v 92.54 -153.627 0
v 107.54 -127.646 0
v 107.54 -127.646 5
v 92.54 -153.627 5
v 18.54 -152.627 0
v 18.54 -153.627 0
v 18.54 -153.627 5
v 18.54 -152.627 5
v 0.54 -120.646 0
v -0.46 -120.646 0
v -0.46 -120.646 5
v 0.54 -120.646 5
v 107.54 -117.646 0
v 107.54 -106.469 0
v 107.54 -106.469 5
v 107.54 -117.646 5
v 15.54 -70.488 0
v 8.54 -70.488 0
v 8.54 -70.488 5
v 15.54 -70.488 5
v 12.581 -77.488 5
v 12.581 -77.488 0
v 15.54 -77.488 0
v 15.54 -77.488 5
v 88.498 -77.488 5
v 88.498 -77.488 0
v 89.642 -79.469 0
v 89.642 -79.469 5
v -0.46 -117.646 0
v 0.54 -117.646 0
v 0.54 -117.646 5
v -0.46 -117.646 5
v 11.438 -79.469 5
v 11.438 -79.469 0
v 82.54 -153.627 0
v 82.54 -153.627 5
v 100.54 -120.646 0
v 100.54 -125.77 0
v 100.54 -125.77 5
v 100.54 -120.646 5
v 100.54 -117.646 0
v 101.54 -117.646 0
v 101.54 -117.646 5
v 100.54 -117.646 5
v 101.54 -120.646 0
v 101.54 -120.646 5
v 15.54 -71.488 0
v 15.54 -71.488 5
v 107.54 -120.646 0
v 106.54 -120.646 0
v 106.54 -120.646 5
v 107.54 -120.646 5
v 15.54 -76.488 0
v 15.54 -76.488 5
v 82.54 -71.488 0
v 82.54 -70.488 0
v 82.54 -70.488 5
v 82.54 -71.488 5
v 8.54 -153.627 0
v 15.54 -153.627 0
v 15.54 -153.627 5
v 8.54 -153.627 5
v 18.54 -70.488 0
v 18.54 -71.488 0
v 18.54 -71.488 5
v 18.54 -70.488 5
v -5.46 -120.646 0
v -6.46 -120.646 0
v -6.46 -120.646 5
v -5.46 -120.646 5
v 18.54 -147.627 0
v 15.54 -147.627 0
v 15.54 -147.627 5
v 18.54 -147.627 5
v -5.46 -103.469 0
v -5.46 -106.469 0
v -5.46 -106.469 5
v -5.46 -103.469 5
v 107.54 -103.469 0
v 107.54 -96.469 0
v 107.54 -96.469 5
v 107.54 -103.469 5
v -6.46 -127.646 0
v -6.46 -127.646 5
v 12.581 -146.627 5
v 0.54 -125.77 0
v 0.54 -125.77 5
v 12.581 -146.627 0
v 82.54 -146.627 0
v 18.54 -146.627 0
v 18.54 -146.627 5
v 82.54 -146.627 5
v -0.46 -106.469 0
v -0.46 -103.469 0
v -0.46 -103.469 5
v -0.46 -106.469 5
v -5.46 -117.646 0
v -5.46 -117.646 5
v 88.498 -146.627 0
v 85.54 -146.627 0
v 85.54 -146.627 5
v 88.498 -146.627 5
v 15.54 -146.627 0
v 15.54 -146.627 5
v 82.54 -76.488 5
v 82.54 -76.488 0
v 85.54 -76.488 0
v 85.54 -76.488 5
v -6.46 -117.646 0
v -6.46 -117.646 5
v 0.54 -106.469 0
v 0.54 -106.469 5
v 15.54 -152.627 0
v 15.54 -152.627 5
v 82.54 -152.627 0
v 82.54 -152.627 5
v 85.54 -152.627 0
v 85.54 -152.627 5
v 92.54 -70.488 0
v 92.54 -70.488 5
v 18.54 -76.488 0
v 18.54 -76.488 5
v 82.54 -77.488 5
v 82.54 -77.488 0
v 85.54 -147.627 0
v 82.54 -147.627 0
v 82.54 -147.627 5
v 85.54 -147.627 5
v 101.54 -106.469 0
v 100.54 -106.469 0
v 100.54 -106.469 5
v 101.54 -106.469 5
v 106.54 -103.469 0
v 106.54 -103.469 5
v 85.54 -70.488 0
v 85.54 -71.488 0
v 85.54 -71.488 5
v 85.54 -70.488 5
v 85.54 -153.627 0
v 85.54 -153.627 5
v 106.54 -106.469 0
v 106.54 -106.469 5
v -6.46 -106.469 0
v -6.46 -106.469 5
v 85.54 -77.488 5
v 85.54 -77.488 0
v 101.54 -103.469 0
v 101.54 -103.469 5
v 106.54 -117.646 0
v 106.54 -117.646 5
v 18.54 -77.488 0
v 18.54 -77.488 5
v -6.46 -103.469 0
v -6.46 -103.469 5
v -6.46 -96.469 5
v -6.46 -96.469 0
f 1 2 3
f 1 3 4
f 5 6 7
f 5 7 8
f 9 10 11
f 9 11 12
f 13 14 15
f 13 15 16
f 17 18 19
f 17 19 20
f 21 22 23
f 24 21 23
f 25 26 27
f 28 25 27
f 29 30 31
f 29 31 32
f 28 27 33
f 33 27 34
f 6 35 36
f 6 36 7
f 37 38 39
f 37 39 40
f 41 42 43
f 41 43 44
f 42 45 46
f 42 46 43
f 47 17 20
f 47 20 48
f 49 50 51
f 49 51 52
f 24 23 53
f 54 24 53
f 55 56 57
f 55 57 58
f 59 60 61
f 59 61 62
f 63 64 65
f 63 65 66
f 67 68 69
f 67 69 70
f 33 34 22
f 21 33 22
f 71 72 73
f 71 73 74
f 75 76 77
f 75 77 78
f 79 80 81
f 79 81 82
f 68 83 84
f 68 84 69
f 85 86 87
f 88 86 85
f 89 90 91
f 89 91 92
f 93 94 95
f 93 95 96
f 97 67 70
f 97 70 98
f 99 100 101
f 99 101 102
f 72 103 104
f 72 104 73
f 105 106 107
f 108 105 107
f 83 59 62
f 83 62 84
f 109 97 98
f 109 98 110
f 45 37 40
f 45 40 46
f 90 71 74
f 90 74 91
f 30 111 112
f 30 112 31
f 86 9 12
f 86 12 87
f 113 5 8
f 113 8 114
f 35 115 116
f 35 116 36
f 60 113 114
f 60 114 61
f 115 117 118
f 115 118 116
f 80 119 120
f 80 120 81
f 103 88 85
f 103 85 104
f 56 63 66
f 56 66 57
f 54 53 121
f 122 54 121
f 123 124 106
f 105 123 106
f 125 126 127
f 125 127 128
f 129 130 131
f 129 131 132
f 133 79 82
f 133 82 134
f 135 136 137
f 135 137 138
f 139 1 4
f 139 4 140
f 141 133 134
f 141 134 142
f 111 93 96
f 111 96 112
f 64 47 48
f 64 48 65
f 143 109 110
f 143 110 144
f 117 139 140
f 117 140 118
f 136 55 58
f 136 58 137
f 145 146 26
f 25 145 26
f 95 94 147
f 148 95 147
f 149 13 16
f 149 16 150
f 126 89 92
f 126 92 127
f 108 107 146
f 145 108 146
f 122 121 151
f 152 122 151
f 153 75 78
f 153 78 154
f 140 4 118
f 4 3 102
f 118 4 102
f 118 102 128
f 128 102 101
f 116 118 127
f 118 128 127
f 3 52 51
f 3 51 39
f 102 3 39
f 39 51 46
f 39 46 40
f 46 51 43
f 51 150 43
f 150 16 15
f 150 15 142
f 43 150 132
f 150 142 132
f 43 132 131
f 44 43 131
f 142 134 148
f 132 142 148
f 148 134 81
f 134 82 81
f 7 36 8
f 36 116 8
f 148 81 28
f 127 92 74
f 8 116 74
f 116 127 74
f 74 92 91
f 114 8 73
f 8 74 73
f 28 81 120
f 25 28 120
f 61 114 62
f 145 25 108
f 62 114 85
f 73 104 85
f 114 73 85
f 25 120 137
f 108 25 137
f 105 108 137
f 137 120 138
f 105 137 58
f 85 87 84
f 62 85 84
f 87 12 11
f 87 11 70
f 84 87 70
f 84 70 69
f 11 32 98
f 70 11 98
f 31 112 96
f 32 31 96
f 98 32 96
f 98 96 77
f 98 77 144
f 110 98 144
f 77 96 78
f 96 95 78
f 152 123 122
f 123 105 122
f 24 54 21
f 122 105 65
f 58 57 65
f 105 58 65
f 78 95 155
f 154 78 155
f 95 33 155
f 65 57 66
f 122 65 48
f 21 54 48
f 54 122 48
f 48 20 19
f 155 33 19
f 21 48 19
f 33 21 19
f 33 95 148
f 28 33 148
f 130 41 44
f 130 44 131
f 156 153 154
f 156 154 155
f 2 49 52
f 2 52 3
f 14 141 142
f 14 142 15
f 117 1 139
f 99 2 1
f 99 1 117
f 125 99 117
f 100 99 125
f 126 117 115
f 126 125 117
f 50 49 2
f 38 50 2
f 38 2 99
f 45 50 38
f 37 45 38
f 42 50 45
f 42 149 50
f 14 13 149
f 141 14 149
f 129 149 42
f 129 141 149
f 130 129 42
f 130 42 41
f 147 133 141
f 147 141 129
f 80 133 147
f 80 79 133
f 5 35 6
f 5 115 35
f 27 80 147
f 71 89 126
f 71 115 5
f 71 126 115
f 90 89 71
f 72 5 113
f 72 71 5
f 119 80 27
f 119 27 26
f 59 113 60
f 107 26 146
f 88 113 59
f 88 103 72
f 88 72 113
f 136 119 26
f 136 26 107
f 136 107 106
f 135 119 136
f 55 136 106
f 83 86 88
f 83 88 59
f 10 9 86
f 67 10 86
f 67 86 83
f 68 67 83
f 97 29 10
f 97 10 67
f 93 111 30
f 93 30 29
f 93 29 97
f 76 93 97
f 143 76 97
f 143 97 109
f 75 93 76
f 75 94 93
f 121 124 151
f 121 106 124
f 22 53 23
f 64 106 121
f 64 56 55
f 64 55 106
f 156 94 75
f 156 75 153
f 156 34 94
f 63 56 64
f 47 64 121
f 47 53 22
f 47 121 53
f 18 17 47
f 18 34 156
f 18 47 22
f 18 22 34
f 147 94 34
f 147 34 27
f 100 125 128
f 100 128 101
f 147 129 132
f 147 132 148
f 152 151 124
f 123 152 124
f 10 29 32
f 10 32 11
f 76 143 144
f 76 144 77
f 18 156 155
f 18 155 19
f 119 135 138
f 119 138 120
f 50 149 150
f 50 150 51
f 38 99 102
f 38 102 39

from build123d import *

# Parameters (mm, degrees)
BOSS_EXTRU_1_DEPTH = 5


with BuildPart() as part:
    # Esquisse1 → Boss.-Extru.1 (new body)
    with BuildSketch(Plane.XY):
        Polygon((82.539833849, -153.626771729), (18.539833849, -153.626771729), (18.539833849, -152.626771729), (15.539833849, -152.626771729), (15.539833849, -153.626771729), (8.539833849, -153.626771729), (-6.460166151, -127.646009615), (-6.460166151, -120.646009615), (-5.460166151, -120.646009615), (-5.460166151, -117.646009615), (-6.460166151, -117.646009615), (-6.460166151, -106.469095079), (-5.460166151, -106.469095079), (-5.460166151, -103.469095079), (-6.460166151, -103.469095079), (-6.460166151, -96.469095079), (8.539833849, -70.488332966), (15.539833849, -70.488332966), (15.539833849, -71.488332966), (18.539833849, -71.488332966), (18.539833849, -70.488332966), (82.539833849, -70.488332966), (82.539833849, -71.488332966), (85.539833849, -71.488332966), (85.539833849, -70.488332966), (92.539833849, -70.488332965), (107.539833849, -96.469095079), (107.539833849, -103.469095079), (106.539833849, -103.469095079), (106.539833849, -106.469095079), (107.539833849, -106.469095079), (107.539833849, -117.646009615), (106.539833849, -117.646009615), (106.539833849, -120.646009615), (107.539833849, -120.646009615), (107.539833849, -127.646009615), (92.539833849, -153.626771729), (85.539833849, -153.626771729), (85.539833849, -152.626771729), (82.539833849, -152.626771729), align=None)
        Polygon((0.539833849, -106.469095079), (0.539833849, -117.646009615), (-0.460166151, -117.646009615), (-0.460166151, -120.646009615), (0.539833849, -120.646009615), (0.539833849, -125.770365268), (12.581285733, -146.626771729), (15.539833849, -146.626771729), (15.539833849, -147.626771729), (18.539833849, -147.626771729), (18.539833849, -146.626771729), (82.539833849, -146.626771729), (82.539833849, -147.626771729), (85.539833849, -147.626771729), (85.539833849, -146.626771729), (88.498381965, -146.626771729), (100.539833849, -125.770365268), (100.539833849, -120.646009615), (101.539833849, -120.646009615), (101.539833849, -117.646009615), (100.539833849, -117.646009615), (100.539833849, -106.469095079), (101.539833849, -106.469095079), (101.539833849, -103.469095079), (100.539833849, -103.469095079), (0.539833849, -103.469095079), (-0.460166151, -103.469095079), (-0.460166151, -106.469095079), align=None, mode=Mode.SUBTRACT)
        Polygon((18.539833849, -77.488332966), (82.539833849, -77.488332966), (82.539833849, -76.488332966), (85.539833849, -76.488332966), (85.539833849, -77.488332966), (88.498381965, -77.488332966), (89.641975504, -79.469095079), (11.437692194, -79.469095079), (12.581285733, -77.488332966), (15.539833849, -77.488332966), (15.539833849, -76.488332966), (18.539833849, -76.488332966), align=None, mode=Mode.SUBTRACT)
    extrude(amount=BOSS_EXTRU_1_DEPTH)


solid = part.part
